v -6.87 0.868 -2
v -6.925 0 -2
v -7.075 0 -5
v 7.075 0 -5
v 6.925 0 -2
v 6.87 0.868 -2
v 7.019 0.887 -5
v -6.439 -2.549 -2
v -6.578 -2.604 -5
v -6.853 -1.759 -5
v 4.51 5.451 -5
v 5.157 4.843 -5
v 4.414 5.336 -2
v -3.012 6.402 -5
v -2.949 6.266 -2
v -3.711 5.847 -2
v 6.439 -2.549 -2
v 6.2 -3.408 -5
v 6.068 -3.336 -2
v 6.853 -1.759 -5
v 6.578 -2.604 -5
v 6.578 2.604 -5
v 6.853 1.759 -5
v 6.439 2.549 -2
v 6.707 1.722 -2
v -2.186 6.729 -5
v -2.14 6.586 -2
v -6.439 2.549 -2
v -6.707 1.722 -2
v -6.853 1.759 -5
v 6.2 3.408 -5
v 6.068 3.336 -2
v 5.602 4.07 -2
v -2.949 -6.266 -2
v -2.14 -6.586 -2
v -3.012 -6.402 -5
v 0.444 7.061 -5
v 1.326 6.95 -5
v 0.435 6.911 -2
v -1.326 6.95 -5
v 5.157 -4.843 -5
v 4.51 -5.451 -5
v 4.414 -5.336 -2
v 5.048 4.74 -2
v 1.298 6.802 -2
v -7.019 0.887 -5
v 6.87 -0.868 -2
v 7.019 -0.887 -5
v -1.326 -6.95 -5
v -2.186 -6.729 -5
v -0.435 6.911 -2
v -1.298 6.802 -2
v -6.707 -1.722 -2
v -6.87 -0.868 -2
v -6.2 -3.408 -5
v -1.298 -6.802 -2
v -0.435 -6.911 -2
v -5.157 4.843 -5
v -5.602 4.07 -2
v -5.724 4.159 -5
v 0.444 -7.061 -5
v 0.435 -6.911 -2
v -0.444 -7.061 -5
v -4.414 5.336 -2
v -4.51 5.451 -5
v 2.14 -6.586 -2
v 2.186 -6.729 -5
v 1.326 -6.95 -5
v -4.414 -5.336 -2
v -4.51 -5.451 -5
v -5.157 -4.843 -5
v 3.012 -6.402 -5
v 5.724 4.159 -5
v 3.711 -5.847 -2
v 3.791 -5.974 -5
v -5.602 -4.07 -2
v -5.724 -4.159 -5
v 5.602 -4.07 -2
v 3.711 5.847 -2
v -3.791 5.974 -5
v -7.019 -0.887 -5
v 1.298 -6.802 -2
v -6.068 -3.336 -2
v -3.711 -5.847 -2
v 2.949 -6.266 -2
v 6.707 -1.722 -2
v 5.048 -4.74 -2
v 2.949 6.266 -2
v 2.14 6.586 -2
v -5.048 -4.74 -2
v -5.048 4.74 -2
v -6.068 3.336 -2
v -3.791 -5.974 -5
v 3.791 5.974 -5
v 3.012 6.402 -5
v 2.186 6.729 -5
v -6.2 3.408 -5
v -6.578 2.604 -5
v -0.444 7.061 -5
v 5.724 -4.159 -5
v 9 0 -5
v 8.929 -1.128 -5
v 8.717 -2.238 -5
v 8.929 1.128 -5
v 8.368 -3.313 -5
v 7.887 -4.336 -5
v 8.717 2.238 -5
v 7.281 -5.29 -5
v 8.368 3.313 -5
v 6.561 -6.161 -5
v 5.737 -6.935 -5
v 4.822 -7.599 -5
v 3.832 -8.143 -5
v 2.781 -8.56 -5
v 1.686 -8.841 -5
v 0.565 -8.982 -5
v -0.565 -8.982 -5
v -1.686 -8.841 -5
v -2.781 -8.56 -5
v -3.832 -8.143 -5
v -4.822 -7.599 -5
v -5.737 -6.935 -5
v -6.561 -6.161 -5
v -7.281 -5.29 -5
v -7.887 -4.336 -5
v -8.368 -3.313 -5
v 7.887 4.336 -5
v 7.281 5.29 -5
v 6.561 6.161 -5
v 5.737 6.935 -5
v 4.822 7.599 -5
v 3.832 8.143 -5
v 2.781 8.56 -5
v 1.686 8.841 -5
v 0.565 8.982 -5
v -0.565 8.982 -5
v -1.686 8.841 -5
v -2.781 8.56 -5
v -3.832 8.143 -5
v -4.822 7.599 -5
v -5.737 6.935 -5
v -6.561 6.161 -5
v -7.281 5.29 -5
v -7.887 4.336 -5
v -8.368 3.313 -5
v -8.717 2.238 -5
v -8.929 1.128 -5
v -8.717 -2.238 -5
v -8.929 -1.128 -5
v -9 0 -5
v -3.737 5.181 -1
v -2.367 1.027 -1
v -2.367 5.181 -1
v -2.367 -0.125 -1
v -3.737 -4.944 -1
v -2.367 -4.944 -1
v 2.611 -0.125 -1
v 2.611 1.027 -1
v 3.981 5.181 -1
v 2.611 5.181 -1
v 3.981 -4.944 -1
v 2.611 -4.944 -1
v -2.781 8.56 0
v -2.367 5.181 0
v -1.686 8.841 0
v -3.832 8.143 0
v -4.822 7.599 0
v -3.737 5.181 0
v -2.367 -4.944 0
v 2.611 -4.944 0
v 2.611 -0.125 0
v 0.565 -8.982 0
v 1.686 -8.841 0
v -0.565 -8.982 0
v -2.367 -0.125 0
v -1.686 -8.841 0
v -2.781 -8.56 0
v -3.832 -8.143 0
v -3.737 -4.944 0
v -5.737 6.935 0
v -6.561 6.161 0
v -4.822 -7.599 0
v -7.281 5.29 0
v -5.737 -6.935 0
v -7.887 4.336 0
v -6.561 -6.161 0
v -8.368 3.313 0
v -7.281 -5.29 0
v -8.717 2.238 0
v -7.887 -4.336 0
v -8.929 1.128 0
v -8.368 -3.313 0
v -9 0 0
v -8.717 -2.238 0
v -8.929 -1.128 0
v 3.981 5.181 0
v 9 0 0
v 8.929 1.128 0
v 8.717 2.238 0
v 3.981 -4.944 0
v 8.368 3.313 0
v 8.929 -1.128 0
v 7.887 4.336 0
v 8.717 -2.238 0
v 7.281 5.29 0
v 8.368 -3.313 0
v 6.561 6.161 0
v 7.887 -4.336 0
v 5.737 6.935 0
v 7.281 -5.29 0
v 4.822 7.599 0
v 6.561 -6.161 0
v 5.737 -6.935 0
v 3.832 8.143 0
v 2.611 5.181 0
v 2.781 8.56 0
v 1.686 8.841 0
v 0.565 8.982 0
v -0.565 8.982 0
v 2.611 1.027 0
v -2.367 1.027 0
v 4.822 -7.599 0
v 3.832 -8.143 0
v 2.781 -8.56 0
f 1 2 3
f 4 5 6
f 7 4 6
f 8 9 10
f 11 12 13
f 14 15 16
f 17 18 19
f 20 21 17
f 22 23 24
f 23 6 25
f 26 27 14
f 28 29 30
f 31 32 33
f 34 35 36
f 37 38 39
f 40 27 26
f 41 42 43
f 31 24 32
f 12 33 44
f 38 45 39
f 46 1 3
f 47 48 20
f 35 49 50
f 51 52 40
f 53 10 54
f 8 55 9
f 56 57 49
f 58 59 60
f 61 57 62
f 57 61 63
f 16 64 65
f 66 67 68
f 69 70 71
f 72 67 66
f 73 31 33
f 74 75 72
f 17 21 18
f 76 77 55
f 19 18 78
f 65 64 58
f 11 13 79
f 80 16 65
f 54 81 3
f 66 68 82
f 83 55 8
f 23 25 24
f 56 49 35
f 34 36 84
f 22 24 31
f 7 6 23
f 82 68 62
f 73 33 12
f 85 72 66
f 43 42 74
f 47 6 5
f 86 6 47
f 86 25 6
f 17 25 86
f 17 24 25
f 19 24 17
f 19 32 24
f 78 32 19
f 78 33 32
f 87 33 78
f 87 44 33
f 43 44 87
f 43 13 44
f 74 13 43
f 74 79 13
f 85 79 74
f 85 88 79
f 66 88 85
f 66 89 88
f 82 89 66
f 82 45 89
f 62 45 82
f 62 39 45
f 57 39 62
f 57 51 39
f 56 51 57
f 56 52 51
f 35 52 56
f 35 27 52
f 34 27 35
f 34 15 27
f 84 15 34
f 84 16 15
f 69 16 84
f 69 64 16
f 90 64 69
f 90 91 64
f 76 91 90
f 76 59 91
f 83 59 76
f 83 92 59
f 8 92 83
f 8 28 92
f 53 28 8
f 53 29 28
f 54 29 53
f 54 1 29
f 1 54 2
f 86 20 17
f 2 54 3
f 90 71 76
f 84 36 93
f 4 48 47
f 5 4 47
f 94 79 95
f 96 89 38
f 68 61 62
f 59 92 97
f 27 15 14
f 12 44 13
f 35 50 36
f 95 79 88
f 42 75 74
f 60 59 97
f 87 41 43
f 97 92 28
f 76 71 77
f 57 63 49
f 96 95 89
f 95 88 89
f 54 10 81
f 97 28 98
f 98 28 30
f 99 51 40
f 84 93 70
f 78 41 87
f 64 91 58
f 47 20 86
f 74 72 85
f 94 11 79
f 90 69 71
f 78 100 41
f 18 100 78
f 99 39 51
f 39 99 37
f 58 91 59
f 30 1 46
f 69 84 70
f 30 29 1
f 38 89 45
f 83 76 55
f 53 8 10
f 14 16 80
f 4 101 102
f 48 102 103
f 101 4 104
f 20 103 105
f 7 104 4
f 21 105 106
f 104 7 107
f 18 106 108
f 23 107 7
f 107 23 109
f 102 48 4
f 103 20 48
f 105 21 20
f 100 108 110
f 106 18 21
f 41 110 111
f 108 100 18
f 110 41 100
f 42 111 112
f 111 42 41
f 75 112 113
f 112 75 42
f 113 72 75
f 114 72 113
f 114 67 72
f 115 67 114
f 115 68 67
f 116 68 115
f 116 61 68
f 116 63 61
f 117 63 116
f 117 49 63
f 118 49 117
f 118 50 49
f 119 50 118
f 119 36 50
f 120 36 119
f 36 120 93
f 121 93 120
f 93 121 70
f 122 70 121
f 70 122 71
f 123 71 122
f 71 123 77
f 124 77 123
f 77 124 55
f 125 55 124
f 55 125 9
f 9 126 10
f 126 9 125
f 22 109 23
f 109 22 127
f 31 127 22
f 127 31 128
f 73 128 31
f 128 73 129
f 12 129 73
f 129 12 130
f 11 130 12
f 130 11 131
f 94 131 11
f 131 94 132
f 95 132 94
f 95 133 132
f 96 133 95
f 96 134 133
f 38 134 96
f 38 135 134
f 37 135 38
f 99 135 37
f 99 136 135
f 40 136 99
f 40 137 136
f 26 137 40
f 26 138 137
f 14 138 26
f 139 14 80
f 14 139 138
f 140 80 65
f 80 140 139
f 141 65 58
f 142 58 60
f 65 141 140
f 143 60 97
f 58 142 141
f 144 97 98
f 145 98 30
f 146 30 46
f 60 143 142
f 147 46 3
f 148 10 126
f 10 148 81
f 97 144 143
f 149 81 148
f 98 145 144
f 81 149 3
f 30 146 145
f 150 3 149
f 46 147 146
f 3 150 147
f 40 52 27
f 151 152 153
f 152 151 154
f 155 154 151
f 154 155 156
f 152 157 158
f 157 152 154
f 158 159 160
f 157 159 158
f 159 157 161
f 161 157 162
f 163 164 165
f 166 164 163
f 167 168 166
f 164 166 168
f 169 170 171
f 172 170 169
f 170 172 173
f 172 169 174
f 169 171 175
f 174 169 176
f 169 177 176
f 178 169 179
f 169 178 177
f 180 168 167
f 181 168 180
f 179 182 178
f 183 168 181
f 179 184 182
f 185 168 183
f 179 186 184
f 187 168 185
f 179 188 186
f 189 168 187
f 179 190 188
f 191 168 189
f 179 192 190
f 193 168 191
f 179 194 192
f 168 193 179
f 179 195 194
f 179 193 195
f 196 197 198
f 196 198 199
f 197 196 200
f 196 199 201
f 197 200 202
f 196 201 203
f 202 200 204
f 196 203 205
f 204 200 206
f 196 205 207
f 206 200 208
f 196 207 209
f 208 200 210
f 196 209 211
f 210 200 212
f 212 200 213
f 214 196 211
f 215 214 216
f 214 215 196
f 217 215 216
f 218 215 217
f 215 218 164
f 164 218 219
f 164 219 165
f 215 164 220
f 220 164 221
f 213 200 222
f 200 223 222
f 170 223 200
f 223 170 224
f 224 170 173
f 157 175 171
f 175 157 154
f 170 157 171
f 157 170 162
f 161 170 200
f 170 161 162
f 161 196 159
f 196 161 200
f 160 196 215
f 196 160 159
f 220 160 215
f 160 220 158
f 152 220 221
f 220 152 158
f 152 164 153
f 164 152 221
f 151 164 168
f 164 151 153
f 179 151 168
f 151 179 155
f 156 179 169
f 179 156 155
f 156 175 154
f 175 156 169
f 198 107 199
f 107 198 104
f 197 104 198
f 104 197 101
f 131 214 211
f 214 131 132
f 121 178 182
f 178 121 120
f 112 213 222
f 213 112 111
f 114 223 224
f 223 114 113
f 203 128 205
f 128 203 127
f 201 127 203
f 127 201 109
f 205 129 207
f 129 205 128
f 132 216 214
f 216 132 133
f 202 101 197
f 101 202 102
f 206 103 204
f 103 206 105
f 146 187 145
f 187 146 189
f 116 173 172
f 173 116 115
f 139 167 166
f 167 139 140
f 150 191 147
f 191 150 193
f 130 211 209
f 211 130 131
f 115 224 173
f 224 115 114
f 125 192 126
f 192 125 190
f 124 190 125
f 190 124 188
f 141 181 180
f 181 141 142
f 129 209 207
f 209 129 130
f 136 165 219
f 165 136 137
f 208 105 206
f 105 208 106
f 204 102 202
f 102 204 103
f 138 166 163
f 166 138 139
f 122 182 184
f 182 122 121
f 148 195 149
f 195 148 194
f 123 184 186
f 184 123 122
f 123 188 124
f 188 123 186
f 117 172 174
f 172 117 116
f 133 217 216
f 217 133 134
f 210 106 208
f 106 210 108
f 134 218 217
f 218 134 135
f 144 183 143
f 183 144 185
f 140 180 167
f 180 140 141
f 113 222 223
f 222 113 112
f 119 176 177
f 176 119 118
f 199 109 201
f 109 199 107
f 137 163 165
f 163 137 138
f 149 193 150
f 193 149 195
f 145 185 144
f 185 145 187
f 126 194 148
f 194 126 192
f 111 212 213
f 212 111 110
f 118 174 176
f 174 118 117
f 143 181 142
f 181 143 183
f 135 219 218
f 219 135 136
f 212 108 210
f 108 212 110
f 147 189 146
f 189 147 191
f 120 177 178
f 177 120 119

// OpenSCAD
$fn = 50;

difference() {
	union() {
		translate(v = [0, 0, -5.0]) {
			cylinder(h = 5, r = 9.0);
		}
	}
	union() {
		#translate(v = [0, 0, -5.0]) {
			cylinder(h = 3, r1 = 7.075, r2 = 6.925);
		}
		translate(v = [0, 0, -1]) {
			linear_extrude(height = 1) {
				text(font = "Impact", halign = "center", size = 10, text = "H", valign = "center");
			}
		}
	}
}
